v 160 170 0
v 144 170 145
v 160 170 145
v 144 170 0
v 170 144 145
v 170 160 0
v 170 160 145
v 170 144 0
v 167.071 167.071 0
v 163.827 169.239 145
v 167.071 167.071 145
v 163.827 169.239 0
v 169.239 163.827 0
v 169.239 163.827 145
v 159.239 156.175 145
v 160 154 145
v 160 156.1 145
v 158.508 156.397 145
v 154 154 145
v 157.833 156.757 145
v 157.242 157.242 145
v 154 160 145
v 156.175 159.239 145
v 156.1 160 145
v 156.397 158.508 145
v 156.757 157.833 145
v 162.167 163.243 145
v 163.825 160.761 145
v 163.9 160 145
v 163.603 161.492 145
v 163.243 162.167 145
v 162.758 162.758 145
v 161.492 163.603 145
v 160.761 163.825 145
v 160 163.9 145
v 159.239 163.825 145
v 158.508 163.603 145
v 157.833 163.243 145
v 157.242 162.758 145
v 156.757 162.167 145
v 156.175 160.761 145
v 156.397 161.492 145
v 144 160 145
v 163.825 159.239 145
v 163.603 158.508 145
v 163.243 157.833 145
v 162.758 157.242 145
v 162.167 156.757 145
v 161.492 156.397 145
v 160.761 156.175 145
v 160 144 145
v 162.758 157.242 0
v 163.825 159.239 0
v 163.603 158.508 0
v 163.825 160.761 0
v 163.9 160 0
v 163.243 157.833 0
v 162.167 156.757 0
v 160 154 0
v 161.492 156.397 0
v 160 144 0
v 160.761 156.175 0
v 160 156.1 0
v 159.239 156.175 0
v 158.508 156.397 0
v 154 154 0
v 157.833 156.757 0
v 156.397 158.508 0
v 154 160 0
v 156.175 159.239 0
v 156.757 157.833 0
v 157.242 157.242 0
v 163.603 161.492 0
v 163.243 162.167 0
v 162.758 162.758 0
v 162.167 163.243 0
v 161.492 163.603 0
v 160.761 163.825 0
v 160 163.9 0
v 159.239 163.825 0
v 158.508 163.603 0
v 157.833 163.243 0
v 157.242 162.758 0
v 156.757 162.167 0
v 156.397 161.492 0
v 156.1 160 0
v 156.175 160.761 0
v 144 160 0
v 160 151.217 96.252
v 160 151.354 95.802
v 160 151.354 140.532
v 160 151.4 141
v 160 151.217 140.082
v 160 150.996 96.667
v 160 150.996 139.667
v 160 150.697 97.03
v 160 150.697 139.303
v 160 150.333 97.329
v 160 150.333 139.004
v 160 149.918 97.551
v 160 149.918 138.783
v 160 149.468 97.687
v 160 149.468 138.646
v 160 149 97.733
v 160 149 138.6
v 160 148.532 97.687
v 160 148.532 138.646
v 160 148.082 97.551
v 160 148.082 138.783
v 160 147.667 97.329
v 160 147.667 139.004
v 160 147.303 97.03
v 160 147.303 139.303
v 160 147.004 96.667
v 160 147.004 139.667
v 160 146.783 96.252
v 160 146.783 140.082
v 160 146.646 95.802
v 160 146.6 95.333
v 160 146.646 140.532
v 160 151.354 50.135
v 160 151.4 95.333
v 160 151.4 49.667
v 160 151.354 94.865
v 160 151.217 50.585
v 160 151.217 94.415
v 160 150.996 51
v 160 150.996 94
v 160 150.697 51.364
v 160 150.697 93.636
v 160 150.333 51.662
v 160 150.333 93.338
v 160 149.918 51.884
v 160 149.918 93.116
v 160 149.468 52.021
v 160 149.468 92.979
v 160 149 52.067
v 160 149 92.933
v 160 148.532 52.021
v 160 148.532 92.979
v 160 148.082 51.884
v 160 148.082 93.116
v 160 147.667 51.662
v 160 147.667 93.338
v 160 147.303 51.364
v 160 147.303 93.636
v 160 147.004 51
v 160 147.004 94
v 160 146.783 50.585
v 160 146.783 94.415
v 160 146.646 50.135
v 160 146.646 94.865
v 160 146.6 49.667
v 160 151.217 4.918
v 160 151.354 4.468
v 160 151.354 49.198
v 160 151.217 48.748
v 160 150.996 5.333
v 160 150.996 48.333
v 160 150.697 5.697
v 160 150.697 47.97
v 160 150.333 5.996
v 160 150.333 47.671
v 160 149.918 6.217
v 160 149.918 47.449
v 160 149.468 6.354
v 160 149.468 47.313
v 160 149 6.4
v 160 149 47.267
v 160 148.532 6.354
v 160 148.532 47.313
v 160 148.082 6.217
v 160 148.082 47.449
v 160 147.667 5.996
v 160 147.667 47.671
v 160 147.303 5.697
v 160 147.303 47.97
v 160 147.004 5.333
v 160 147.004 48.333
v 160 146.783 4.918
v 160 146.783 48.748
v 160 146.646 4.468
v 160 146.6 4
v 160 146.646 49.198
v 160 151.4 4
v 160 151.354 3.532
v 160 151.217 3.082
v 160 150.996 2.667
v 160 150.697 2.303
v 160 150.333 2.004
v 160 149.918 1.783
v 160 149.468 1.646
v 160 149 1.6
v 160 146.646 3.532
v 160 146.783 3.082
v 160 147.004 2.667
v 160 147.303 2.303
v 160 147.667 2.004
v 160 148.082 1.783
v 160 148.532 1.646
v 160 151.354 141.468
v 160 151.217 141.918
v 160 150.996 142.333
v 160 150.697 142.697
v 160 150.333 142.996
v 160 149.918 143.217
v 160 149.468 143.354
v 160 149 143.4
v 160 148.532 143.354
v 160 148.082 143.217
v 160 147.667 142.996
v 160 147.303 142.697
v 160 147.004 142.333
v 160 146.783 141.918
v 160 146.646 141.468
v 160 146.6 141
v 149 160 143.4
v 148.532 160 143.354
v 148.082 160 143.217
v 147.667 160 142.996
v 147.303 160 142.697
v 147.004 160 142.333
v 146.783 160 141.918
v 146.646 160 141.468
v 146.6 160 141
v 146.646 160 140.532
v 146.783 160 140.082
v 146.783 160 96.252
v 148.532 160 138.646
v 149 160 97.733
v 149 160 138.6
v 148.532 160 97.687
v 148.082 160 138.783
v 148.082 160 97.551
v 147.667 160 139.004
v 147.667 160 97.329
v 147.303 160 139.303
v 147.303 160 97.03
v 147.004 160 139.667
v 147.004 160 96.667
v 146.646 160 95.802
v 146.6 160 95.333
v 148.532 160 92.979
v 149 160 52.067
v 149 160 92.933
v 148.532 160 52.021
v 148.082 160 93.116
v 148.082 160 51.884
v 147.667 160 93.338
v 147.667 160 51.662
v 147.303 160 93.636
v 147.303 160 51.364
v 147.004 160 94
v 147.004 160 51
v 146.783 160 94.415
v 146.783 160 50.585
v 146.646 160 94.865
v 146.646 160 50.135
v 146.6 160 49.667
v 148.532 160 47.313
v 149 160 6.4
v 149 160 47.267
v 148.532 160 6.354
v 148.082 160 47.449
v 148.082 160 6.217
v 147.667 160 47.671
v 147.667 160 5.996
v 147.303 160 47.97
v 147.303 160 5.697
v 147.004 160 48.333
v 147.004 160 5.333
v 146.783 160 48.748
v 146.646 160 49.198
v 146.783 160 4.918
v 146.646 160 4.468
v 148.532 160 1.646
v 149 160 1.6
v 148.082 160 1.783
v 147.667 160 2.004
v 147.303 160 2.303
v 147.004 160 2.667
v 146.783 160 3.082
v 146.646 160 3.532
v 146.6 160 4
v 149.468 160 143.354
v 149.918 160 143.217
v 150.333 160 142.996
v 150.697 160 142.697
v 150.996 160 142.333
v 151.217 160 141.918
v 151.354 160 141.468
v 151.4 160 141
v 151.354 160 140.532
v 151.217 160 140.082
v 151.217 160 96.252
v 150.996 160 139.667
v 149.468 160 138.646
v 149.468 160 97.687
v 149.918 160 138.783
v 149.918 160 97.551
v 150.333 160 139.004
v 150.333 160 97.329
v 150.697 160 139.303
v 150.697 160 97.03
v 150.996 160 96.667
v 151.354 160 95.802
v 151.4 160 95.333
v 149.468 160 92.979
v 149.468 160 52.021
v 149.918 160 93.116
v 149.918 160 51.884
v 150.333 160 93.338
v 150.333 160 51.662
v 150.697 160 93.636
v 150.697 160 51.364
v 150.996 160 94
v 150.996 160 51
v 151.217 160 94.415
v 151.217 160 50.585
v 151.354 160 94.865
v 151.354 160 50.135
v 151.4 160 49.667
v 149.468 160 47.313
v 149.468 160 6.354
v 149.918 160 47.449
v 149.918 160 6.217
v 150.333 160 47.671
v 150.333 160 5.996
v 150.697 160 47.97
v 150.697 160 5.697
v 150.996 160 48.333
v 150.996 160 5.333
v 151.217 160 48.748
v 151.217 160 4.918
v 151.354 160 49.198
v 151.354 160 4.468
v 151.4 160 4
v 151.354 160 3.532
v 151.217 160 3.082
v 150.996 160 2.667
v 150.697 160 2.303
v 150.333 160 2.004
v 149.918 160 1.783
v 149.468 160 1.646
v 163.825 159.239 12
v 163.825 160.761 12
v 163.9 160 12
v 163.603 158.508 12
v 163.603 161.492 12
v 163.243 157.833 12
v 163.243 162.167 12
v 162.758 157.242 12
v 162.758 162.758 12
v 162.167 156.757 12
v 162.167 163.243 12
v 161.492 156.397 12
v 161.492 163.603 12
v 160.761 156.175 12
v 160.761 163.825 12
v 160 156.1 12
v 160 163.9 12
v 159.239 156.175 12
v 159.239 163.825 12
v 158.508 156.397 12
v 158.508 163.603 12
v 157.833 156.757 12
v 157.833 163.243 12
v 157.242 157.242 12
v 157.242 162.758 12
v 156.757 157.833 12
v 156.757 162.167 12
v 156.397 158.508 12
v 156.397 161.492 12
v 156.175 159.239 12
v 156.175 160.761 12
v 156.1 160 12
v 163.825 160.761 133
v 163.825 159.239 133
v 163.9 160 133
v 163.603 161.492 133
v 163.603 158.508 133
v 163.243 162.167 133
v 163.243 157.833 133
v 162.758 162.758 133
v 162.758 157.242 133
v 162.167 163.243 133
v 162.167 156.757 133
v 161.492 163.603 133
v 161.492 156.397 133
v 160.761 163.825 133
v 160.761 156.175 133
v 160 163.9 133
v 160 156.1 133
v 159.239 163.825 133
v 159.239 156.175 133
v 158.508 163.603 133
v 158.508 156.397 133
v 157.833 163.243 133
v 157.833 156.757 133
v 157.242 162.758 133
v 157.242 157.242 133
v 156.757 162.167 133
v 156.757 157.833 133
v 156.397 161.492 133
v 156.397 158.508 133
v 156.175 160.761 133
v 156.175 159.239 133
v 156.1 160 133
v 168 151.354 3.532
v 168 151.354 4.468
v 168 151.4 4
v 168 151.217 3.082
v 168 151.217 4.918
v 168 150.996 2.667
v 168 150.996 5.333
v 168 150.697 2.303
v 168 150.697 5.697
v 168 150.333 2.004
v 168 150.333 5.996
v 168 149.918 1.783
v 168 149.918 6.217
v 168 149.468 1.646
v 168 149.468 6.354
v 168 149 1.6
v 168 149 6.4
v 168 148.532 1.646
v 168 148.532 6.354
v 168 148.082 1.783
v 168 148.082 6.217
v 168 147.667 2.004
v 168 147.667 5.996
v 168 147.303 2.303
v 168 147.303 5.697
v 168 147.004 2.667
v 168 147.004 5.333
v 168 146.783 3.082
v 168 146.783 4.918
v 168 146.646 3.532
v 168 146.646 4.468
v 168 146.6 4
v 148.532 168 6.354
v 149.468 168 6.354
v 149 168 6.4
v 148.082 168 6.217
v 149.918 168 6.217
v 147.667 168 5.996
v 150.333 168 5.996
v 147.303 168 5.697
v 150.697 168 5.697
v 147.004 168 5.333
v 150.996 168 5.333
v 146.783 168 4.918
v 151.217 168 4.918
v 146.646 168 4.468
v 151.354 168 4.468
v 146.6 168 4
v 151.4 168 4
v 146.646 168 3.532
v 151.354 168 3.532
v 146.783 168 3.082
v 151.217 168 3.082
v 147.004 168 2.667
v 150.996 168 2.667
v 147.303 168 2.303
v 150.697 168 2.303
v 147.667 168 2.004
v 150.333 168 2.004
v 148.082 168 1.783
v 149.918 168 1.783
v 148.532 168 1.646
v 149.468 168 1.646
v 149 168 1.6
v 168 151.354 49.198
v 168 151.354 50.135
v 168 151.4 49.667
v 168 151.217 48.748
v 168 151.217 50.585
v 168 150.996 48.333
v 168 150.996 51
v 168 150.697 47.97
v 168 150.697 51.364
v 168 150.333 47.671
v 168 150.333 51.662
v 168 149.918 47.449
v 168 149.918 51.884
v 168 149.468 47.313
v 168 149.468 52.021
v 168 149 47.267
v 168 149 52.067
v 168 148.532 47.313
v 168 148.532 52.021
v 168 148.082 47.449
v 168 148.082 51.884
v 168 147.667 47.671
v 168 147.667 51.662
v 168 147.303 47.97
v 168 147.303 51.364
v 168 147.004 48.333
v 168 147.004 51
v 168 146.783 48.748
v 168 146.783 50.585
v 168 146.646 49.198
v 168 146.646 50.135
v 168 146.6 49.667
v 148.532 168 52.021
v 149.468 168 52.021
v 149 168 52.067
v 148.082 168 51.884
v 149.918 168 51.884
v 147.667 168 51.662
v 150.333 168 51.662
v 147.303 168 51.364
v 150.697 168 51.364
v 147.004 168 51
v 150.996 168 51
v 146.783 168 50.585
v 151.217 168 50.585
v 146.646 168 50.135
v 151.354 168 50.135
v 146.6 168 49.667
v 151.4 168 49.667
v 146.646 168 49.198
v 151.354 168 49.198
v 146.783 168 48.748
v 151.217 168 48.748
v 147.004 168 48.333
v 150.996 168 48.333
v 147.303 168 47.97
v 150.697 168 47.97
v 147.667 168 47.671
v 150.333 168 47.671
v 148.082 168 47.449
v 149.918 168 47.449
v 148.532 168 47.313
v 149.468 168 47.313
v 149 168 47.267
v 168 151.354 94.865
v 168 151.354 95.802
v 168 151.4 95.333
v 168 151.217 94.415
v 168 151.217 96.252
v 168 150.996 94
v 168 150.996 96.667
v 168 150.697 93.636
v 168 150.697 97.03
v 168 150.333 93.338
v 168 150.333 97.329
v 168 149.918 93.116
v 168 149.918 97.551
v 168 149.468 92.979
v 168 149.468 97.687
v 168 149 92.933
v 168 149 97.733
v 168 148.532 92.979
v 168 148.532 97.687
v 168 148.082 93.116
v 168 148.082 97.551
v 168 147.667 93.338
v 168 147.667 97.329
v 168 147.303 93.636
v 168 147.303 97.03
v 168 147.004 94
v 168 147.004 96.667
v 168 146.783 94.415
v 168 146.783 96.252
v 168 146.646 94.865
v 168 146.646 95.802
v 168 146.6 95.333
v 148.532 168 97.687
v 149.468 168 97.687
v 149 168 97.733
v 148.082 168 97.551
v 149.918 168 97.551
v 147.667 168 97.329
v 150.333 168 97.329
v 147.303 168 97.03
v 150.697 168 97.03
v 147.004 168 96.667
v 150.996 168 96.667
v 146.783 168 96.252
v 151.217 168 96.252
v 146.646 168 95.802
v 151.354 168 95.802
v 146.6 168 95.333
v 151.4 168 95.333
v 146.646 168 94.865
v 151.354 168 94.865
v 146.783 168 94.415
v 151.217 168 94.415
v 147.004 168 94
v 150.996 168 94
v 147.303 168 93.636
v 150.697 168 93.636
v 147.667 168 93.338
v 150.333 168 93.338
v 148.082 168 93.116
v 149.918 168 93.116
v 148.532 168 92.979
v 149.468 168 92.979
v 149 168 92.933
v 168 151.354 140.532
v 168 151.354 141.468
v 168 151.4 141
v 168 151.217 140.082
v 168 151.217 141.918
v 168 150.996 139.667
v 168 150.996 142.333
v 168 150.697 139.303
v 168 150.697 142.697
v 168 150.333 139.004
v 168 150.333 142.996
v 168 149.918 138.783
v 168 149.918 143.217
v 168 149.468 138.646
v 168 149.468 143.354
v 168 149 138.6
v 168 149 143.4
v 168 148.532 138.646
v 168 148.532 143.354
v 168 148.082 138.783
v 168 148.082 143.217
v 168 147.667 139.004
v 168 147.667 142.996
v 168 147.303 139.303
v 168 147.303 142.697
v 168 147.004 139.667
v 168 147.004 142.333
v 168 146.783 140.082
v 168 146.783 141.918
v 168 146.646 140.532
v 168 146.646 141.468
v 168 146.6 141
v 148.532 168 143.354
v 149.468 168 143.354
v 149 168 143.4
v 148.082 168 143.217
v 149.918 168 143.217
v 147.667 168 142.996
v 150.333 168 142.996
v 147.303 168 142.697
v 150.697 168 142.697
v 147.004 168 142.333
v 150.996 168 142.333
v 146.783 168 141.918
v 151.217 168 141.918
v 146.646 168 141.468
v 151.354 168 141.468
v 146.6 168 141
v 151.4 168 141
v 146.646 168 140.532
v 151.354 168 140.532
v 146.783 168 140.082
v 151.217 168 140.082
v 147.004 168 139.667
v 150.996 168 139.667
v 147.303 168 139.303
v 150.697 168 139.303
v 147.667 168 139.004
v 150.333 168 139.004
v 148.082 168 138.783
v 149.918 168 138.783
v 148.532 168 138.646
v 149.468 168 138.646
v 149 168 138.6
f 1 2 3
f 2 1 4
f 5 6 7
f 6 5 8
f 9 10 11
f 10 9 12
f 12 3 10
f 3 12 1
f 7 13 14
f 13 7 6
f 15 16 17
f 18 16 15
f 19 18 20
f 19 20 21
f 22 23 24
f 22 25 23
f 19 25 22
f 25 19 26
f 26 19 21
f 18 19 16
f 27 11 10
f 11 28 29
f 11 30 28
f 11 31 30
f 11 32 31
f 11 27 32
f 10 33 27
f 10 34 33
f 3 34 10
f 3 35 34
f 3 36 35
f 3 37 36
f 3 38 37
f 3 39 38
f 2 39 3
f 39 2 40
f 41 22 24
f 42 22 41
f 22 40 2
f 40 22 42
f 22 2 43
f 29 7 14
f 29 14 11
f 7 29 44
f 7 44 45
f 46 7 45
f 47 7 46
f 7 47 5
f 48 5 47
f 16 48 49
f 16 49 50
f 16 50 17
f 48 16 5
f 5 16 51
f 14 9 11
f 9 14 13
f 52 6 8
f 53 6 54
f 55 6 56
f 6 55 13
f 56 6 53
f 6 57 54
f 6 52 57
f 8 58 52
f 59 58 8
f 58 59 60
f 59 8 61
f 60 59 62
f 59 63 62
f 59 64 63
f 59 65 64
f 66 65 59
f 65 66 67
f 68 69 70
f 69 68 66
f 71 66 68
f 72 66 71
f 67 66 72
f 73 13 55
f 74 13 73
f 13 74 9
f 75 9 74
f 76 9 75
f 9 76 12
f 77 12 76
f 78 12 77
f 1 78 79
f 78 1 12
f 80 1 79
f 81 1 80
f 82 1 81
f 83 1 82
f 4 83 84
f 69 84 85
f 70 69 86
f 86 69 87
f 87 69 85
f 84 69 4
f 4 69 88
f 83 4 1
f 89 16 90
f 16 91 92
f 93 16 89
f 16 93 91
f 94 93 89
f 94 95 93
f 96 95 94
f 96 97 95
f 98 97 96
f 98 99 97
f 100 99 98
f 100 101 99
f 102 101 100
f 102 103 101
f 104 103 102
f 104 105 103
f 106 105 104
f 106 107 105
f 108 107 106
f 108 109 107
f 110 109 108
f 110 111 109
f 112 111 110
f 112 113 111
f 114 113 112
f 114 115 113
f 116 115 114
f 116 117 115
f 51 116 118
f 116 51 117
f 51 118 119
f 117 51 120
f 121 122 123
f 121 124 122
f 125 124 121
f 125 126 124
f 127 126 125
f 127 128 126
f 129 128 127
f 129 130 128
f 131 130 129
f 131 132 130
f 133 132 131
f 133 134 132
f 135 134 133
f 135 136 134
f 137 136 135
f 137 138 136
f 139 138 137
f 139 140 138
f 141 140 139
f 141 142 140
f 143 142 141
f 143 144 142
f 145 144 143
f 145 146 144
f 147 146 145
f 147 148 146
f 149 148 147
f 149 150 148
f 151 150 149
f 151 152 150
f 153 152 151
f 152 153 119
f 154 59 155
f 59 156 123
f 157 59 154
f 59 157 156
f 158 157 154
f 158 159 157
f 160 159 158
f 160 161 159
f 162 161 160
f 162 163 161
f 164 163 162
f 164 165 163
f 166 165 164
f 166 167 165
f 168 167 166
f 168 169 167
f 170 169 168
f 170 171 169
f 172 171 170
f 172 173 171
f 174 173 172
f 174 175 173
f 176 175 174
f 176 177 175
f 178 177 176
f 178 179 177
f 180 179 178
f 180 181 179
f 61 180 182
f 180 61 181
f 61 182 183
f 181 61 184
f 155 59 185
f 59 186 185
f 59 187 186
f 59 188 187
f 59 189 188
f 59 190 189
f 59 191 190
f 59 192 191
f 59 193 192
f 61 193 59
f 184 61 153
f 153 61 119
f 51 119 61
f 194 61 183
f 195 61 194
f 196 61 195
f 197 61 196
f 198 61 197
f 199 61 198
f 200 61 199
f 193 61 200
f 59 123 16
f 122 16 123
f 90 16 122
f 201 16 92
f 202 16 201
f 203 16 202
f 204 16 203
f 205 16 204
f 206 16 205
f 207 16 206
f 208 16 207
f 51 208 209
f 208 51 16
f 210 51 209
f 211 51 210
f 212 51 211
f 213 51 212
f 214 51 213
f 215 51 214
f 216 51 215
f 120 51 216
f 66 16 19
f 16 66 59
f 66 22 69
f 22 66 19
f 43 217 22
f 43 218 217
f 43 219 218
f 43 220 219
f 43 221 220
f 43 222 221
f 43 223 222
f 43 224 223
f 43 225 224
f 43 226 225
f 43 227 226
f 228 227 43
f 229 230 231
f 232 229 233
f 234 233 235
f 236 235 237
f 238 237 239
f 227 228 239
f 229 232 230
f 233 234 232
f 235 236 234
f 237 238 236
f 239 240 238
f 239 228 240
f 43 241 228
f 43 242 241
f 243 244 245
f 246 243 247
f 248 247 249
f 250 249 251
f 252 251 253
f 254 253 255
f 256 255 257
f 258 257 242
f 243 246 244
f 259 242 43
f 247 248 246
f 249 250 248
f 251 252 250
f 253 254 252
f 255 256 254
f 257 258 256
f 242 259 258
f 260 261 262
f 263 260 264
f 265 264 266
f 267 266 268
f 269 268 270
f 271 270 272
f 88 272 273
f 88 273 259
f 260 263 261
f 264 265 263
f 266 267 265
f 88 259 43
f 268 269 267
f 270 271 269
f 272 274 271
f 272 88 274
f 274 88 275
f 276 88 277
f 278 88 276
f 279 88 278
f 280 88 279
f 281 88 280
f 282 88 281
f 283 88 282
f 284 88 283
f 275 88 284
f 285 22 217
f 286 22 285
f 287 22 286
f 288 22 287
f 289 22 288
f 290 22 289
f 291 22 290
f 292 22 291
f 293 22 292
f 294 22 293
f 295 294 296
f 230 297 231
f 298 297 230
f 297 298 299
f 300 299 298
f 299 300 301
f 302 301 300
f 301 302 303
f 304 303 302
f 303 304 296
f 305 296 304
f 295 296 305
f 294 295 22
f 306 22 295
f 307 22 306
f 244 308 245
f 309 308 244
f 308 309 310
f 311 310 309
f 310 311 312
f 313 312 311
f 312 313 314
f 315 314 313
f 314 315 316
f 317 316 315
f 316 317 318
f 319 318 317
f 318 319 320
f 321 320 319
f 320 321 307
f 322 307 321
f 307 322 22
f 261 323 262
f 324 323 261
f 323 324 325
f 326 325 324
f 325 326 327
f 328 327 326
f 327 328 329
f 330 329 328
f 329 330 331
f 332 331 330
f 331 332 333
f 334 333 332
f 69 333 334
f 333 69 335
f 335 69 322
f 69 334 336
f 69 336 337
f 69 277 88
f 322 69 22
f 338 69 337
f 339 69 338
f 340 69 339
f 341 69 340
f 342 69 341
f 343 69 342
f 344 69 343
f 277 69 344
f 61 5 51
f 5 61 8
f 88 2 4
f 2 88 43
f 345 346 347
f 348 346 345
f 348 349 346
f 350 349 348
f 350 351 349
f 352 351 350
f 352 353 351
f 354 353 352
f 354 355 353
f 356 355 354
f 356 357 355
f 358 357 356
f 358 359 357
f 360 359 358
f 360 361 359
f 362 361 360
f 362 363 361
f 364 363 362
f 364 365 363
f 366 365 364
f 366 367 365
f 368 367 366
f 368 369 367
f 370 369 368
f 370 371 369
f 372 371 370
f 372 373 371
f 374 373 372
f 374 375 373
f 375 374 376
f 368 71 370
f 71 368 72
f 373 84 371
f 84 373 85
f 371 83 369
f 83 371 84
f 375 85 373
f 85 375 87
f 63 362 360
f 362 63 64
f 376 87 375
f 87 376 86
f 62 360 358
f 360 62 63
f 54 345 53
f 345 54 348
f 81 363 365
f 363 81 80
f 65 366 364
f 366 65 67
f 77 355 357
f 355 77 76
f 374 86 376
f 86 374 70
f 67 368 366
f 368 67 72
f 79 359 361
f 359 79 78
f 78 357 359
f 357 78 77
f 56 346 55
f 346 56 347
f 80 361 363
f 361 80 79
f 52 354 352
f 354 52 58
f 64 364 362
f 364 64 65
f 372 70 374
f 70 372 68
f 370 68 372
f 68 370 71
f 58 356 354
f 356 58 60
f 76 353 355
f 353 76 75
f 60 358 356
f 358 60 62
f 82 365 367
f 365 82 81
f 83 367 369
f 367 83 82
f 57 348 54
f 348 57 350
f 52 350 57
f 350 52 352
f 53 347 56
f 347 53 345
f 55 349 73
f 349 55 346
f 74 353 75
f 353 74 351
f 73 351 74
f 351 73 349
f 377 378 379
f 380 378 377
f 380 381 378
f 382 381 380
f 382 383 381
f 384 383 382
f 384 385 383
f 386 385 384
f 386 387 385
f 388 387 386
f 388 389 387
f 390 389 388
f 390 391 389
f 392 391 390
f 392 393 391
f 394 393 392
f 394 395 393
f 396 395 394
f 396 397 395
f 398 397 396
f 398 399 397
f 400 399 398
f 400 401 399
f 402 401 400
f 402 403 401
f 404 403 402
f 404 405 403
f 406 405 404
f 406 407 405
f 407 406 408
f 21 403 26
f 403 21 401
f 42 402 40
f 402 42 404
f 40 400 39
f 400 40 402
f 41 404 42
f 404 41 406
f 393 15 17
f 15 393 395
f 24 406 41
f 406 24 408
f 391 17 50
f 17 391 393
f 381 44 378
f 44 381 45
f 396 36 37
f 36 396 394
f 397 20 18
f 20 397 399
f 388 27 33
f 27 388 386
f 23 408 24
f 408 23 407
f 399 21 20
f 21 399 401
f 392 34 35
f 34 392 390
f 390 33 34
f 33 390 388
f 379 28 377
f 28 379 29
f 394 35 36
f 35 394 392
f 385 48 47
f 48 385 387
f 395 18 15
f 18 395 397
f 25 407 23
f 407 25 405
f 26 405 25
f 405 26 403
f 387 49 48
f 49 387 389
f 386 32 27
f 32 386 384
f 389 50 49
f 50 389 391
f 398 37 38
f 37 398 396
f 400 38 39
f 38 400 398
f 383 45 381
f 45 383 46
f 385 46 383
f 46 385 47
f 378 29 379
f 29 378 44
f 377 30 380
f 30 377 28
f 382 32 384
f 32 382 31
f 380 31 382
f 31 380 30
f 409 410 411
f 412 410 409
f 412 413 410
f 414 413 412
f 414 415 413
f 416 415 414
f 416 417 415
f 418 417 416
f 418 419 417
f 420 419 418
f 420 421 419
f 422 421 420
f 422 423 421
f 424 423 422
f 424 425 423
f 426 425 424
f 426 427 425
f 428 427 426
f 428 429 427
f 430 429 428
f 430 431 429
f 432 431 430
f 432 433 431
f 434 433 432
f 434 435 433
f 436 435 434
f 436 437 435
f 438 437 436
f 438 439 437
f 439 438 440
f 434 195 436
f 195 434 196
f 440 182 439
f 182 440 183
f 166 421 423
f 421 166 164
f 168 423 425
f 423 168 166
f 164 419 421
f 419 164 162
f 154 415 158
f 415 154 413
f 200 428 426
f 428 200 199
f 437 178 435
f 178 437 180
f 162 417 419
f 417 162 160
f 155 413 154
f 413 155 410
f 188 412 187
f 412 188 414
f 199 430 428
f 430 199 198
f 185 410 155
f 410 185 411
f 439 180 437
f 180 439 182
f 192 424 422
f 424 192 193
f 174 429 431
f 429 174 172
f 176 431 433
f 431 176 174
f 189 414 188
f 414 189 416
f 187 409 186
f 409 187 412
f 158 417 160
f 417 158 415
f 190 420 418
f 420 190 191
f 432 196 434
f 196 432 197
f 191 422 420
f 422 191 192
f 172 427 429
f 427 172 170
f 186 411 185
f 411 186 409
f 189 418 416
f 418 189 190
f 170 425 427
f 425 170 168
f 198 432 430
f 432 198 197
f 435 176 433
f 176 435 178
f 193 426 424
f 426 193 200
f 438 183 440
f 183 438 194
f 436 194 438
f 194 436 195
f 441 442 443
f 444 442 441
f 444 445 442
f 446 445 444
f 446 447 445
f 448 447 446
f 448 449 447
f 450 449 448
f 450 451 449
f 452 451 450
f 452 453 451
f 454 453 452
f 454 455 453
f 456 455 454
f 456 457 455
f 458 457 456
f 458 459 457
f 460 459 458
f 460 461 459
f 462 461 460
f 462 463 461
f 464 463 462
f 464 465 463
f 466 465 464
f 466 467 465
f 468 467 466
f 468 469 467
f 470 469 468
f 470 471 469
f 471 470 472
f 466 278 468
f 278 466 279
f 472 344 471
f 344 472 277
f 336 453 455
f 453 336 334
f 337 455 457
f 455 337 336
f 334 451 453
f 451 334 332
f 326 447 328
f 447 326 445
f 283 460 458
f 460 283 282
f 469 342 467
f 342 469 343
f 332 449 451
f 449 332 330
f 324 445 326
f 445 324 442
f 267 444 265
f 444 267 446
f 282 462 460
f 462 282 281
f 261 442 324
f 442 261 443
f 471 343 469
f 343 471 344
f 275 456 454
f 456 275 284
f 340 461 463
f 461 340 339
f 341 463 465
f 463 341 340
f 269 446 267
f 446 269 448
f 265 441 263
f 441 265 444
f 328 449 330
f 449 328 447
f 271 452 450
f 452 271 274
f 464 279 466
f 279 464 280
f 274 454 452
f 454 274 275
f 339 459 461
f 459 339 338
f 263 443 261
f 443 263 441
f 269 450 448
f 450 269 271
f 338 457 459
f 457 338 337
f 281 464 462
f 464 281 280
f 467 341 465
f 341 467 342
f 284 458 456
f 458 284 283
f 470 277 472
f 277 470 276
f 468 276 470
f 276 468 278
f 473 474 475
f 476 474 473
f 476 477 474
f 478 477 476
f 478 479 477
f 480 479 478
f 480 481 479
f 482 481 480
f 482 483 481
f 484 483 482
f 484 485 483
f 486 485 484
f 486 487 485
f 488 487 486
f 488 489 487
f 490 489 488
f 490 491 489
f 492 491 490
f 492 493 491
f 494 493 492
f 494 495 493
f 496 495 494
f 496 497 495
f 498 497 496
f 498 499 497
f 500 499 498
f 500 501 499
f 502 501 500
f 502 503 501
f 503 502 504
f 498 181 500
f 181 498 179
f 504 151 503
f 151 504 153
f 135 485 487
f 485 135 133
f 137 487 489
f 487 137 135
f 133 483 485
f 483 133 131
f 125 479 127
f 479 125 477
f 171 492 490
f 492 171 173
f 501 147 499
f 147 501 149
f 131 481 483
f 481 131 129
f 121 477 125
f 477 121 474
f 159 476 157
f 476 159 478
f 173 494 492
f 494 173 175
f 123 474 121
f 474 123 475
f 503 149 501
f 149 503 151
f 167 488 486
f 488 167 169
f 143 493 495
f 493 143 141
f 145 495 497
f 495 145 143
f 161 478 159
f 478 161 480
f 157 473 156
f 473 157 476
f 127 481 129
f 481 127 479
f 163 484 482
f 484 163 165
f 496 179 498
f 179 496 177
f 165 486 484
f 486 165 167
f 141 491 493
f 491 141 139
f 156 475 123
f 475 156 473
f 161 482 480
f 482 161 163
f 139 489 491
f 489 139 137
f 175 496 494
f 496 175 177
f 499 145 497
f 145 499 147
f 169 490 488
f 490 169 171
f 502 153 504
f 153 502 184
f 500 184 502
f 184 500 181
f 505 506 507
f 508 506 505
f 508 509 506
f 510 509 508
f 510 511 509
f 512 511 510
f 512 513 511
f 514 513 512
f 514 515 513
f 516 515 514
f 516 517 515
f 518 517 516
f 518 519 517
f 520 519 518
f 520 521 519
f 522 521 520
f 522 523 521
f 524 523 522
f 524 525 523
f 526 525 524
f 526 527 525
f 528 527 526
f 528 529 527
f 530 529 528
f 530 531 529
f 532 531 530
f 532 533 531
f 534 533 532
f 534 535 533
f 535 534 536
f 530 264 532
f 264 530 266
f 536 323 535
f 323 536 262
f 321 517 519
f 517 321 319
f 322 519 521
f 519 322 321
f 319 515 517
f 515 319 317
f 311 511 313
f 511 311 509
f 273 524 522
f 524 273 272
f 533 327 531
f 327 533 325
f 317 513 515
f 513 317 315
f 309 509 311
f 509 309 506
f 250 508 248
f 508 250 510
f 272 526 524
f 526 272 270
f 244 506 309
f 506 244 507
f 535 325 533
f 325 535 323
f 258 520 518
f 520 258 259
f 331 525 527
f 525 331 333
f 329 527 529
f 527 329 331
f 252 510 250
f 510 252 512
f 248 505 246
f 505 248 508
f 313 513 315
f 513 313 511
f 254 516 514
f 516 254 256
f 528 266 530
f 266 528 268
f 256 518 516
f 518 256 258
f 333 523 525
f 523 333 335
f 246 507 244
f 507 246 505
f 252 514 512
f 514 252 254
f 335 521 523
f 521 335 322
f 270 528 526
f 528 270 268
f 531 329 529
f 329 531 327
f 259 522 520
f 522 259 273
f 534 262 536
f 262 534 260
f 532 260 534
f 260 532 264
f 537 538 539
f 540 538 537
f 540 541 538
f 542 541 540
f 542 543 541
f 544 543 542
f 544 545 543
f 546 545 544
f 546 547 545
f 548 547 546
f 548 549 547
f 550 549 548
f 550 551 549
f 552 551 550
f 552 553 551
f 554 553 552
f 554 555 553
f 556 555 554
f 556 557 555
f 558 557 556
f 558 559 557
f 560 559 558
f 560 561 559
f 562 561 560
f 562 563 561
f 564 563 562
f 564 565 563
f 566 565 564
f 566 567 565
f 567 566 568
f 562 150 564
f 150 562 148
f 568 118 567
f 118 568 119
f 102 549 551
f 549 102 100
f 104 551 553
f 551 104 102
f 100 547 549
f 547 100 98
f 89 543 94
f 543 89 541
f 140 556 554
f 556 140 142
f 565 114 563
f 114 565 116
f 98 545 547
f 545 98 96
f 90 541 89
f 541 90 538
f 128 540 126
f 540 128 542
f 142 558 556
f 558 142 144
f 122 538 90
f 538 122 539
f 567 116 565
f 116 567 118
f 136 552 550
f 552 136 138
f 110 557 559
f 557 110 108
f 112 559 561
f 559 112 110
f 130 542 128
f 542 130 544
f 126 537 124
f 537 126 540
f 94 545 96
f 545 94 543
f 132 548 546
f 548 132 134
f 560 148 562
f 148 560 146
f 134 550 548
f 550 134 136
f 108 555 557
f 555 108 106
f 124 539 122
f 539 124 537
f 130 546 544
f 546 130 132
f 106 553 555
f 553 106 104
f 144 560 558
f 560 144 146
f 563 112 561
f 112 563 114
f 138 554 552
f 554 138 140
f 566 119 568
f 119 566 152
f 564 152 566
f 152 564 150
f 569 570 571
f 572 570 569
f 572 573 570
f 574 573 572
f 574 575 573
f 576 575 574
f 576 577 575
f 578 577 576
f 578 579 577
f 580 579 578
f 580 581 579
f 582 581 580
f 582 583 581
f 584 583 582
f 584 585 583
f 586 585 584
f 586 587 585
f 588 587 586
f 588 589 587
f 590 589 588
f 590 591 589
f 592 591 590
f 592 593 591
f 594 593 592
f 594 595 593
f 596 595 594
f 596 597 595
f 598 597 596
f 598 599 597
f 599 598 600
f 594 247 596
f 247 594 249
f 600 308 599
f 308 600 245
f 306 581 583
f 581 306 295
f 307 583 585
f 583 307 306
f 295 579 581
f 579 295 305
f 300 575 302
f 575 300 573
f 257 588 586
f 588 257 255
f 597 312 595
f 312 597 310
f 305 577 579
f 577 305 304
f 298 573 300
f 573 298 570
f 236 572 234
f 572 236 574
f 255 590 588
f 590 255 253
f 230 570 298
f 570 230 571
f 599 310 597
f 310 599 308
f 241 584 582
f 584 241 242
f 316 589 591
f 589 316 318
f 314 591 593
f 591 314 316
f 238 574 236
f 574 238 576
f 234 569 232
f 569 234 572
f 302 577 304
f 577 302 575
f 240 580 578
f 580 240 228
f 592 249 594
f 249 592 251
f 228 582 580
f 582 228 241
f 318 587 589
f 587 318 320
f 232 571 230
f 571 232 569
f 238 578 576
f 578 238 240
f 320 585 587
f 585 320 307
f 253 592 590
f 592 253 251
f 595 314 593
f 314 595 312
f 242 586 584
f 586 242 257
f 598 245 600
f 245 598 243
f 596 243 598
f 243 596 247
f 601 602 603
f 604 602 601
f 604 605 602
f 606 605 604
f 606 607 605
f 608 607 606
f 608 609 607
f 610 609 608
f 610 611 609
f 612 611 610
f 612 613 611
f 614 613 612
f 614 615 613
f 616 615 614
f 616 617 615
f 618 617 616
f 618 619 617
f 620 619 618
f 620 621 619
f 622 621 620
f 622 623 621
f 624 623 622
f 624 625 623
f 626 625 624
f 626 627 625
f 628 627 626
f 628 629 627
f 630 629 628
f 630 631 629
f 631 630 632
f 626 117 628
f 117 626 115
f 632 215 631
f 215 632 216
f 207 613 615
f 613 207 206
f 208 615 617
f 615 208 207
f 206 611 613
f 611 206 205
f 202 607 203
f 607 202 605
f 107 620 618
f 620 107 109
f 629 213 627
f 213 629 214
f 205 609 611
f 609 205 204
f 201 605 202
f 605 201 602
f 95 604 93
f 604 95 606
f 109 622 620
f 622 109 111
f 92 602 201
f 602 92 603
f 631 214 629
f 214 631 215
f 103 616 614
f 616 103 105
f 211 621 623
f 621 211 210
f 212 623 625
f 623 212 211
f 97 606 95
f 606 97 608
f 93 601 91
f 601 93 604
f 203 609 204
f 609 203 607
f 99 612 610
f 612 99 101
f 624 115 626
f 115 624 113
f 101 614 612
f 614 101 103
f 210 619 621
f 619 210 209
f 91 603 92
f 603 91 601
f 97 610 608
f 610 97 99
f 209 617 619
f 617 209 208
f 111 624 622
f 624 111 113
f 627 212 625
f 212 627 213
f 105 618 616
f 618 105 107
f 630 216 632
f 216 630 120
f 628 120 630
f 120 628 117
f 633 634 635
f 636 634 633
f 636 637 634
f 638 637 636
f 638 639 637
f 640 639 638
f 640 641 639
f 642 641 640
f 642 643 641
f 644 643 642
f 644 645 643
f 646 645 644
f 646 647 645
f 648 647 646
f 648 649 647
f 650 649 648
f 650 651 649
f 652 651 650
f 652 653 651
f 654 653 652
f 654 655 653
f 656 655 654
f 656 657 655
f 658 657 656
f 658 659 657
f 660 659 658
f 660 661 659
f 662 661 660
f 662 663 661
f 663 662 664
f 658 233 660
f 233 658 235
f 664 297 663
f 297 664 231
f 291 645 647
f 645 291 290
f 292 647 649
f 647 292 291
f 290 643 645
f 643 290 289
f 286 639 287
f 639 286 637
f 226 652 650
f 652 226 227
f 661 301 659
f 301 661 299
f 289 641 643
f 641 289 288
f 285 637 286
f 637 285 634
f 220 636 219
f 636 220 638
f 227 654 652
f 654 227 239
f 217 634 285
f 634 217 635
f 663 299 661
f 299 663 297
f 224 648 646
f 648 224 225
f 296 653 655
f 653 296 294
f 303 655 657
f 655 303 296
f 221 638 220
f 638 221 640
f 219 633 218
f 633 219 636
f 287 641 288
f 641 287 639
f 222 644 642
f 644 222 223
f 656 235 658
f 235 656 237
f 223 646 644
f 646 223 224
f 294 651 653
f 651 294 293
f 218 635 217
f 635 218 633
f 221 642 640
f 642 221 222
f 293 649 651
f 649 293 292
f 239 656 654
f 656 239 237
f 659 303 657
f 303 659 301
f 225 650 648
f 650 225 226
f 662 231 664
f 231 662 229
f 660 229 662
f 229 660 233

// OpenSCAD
// file: fan.scad
use <bolts.scad>;
use <zcube.scad>;

module fan(diameter = 140, thickness = 25) {
	translate([-diameter/2, -diameter/2, -thickness]) color("blue") cube([diameter, diameter, thickness]);
}

module fan_holes(diameter = 140, spacing = 124.5, z = 10) {
	outset = spacing / 2;
	
	translate([outset, outset, z]) children();
	translate([-outset, outset, z]) children();
	translate([-outset, -outset, z]) children();
	translate([outset, -outset, z]) children();
}

module fan_cutout(diameter = 140, thickness = 6, wall = 3, spacing = 124.5) {
	render() {
		translate([0, 0, -0.1]) cylinder_outer(thickness+0.2, diameter/2);
		
		translate([0, 0, wall]) zcorners() hull() {
			translate([-spacing/2, -spacing/2, 0]) cylinder_outer(thickness-wall+0.1, (diameter-spacing)/2);
			cylinder_outer(thickness-wall+0.1, diameter/5);
		}
		
		fan_holes() translate([0, 0, -35]) hole(3, 35);
	}
}

color("brown") fan();
#fan_holes() translate([0, 0, -35]) hole(3, 35);
fan_cutout();
// file: sx500g.scad
use <bolts.scad>;
use <zcube.scad>;

module sx500g() {
	difference() {
		// http://silverstonetek.com/goods_cable_define/sx500-g-cable-define.pdf
		color("grey") translate([-125/2, 0, -63]) cube([125, 100, 63]);
		sx500g_holes() rotate(90, [1, 0, 0]) hole(3, 10);
	}
}

module sx500g_holes(inset = 6, width = 125, height = 63) {
	translate([-width/2+inset, 0, -inset]) children();
	translate([width/2-inset, 0, -inset]) children();
	
	// TODO I don't know if this is correct.. 
	translate([-width/2+inset, 0, -height/2]) children();
	translate([width/2-inset, 0, -height/2]) children();
	
	translate([-width/2+inset, 0, inset-height]) children();
	translate([width/2-inset, 0, inset-height]) children();
}

module sx500g_cutout(thickness = 10, inset = 10) {
	render() difference() {
		color("grey") translate([0, 0.1, -63/2]) rotate([90, 0, 0]) zcube([125-inset, 63-inset, thickness+0.2]);

		sx500g_holes() rotate([90, 0, 0]) cylinder(d=10, h=thickness+0.1);
	}
	
	sx500g_holes() translate([0, 30-thickness, 0]) rotate([90, 0, 0]) hole(3, 30);
}

sx500g();
color("red") sx500g_cutout();
// file: h115i.scad
use <bolts.scad>;

use <fan.scad>;

module h115i(diameter = 140, spacing = 124.5, offset = 20) {
	outset = (diameter - spacing) / 2;
	dy = (offset / 2) - outset;
	
	// Corsair H115i
	// Radiator dimensions: 140mm x 312mm x 26mm
	// Fan dimensions: 140mm x 25mm
	render() difference() {
		union() {
			color([0.1, 0.1, 0.1]) translate([-(26+25), -312/2, -140/2]) cube([26, 312, 140]);
			
			color("blue") {
				translate([0, -70-dy, 0]) rotate([0, 90, 0]) fan();
				translate([0, 70+dy, 0]) rotate([0, 90, 0]) fan();
			}
		}
		
		h115i_cutout();
	}
}

module h115i_cutout(diameter = 140, spacing = 124.5, offset = 20) {
	outset = (diameter - spacing) / 2;
	dy = (offset / 2) - outset;
	
	translate([0, -70-dy, 0]) rotate([0, 90, 0]) fan_cutout();
	translate([0, 70+dy, 0]) rotate([0, 90, 0]) fan_cutout();
}

h115i();
color("red") h115i_cutout();
// file: zcube.scad
// This function creates a cube with a given x/y either above (f=1) or below (f=-1) the z axis.
module zcube(dimensions, z=0, f=1) {
	translate([0, 0, dimensions[2]/2 * f + z]) cube(dimensions, true);
}

module rcube(dimensions, d, z=0, f=1) {
	dx = dimensions[0]/2 - d/2;
	dy = dimensions[1]/2 - d/2;
	dz = dimensions[2]/2 * (f-1) + z;
	
	hull() {
		translate([-dx, -dy, dz]) cylinder(h=dimensions[2], d=d);
		translate([-dx, dy, dz]) cylinder(h=dimensions[2], d=d);
		translate([dx, -dy, dz]) cylinder(h=dimensions[2], d=d);
		translate([dx, dy, dz]) cylinder(h=dimensions[2], d=d);
	}
}

module zcorners() {
	children();
	mirror([1, 0, 0]) children();
	mirror([0, 1, 0]) children();
	mirror([1, 1, 0]) children();
}
// file: bolts.scad
$radial_error = 0.1;
$fn = 32;

module cylinder_outer(height, radius, fn=$fn, radial_error=$radial_error) {
	fudge = 1/cos(180/fn);
	cylinder(h=height,r=radius*fudge+$radial_error, $fn=fn);
}

module cylinder_inner(height, radius, fn=$fn) {
	cylinder(h=height,r=radius-$radial_error,$fn=fn);
}

// Make a hole. The diameter is the size of the screw (e.g. 3 for M3). Depth is how far the hole should go for the thread, and inset is how far out there should be a hole for the head to go.
module hole(diameter=3, depth=6, inset=10) {
	cylinder_outer(depth, diameter/2);
	translate([0, 0, depth]) cylinder_outer(inset, diameter, 32);
}

module countersunk_hole(diameter=3, depth=6, inset=10) {
	hole(diameter, depth, inset);
	translate([0, 0, depth-diameter/2]) cylinder(r1=diameter/2+$radial_error, r2=diameter+$radial_error, h=diameter/2);
}

module threaded_countersunk_hole(diameter=3, depth=6, inset=10) {
	hole(diameter*0.9, depth, inset);
	translate([0, 0, depth-diameter/2]) cylinder(r1=diameter/2+$radial_error, r2=diameter+$radial_error, h=diameter/2);
}

module knurled_insert(diameter = 3, depth = 6, thickness = 1) {
	cylinder_inner(depth, diameter/2 + thickness);
}

module knurled_hole(diameter = 3, depth = 6, inset = 10, insert = 4, thickness = 1) {
	hole(diameter, depth, inset);
	
	knurled_insert(diameter, insert, thickness);
}

module countersunk_knurled_hole(diameter = 3, depth = 6, inset = 10, insert = 4, thickness = 1) {
	countersunk_hole(diameter, depth, inset);
	
	knurled_insert(diameter, insert, thickness);
}

// Make a hole for a bolt/screw combination.
module bolted_hole(diameter=3, depth=8, nut_offset=2, shaft_length=10, inset=10) {
	hole(diameter, depth, inset);
	hull() {
		shaft_width = diameter;
		translate([0, 0, nut_offset]) rotate(360/12, [0, 0, 1]) cylinder_outer(diameter, shaft_width, 6);
		translate([0, shaft_length, nut_offset]) rotate(360/12, [0, 0, 1]) cylinder_outer(diameter, shaft_width, 6);
	}
}

module countersunk_bolted_hole(diameter=3, depth=8, nut_offset=2, shaft_length=10, inset=10) {
	countersunk_hole(diameter, depth, inset);
	hull() {
		shaft_width = diameter;
		translate([0, 0, nut_offset]) rotate(360/12, [0, 0, 1]) cylinder_outer(diameter, shaft_width, 6);
		translate([0, shaft_length, nut_offset]) rotate(360/12, [0, 0, 1]) cylinder_outer(diameter, shaft_width, 6);
	}
}

module mounting_hole(diameter=3, depth=6, inset=10, outset=3) {
	difference() {
		cylinder_outer(depth, diameter/2+outset);
		hole(diameter=diameter, depth=depth, inset=inset);
	}
}

render() rotate(90, [1, 0, 0]) difference() {
	cube([40, 10, 10]);
	translate([5, 5, 0]) bolted_hole(diameter=3, depth=8);
	translate([15, 5, 0]) bolted_hole(diameter=4, depth=8);
	translate([25, 5, 0]) countersunk_hole(diameter=4, depth=8);
	translate([35, 5, 0]) knurled_hole();
}
// file: matx.scad
$tolerance = 0.1;
$fn = 4*4;

use <bolts.scad>;
use <zcube.scad>;

use <h115i.scad>;
use <sx500g.scad>;

use <fan.scad>;

function inch(x) = x * 25.4;

internal_size = [308, 308, 140+5];

module pci_card() {
	translate([1.6/2, 19.8, 7.6+4]) rotate(-90, [0, 0, 1]) rotate(90, [1, 0, 0]) color("brown") import("gtx.stl", convexity=4);
}

module standoffs() {
	// DATUM B as per the microATX specification is the origin.
	children();
	translate([inch(1.8), 0, 0]) children();
	translate([inch(8), inch(-0.9), 0]) children();
	
	translate([0, inch(-6.1), 0]) {
		translate([inch(-0.8), 0, 0]) children();
		children();
		translate([inch(1.8), 0, 0]) children();
		translate([inch(8), 0, 0]) children();
	}
	
	translate([0, inch(-8.95), 0]) {
		translate([inch(1.8), 0, 0]) children();
		translate([inch(8), 0, 0]) children();
	}
}

module pci_connectors(inset = inch(-0.6), factor = 0.5, count = 4) {
	// This is the position of pin 0 is given when factor is 0, otherwise when factor = 0.5 it's the midpoints.
	translate([inch(-1.2), inset, 0]) {
		for (x = [0:1:count-1])
			translate([inch(0.8*(x+factor)), 0, 0]) children();
	}
}

module motherboard(thickness=1.6) {
	difference() {
		color("green") translate([inch(-1.35), inch(0.4-9.6), 0]) cube([inch(9.6), inch(9.6), thickness]);
		standoffs() color("white") cylinder(d=4, h=10, $fn=12);
	}
	
	//translate([6.64, -46.94, 0]) pci_card();
	translate([47.28, -46.94, 0]) pci_card();
	
	// A very rough approximation of where the CPU is likely to be.
	translate([inch(5), inch(-4.5), thickness]) color("silver") zcube([inch(3), inch(2.5), inch(1.5)]);
	
	color("grey") {
		pci_connectors() translate([0, 0, thickness]) scale([1.0, -1.0, 1.0]) cube([inch(0.4), inch(5), inch(0.4)]);
	}
}

module rear_io_cutout() {
	translate([inch(2.096), inch(0.483)-$tolerance, inch(-0.088)]) cube([inch(6.25), 20, inch(1.75)]);
	translate([inch(2.096-0.1), inch(0.483+0.05)-$tolerance, inch(-0.088-0.1)]) cube([inch(6.25+0.2), 20, inch(1.75+0.2)]);
}

module rear_powersupply() {
	translate([inch(2.096+3), inch(0.483-2), inch(2)]) {
		power_supply();
	}
}

module rear_pci_cutout(width = 14) {
	pci_connectors(inch(0.483), 0.5) {
		translate([-width/2, 0-$tolerance, 0]) cube([width, 20, 100]);
		translate([-inch(0.3), 0-$tolerance, 108.8]) cube([inch(0.8)+$tolerance, 20, 1]);
		translate([-inch(0.3), 0-$tolerance, 108.8]) cube([inch(0.8)+$tolerance, 20, 50]);
		
		// TODO Just eyeballed this.
		translate([9.215, 4.95, 108.8-5]) hole(3, 5);
		
		// TODO Just eyeballed this.
		translate([2.7, 8.95, 107]) zcube([8, 4, 6]);
	}
}

module rear_pci_bracket(width = 14) {
	pci_connectors(inch(0.483), 0.5) {
		translate([inch(0.1), 6, 108.8-6]) rcube([inch(0.9), 10, 6], 6);
	}
}

module walls(dimensions, thickness = 6) {
	render() difference() {
		color([0.2, 0.2, 0.2, 0.7]) {
			difference() {
				zcube([dimensions[0]+thickness*2, dimensions[1]+thickness*2, dimensions[2]], d=20);
				zcube(dimensions);
			}
			
			bottom_tray(dimensions) {
				rear_pci_bracket();
			}
		}
		
		front_fan(dimensions) fan_cutout();
		top_radiator(dimensions) h115i_cutout();
		back_power_supply(dimensions) sx500g_cutout();
		
		bottom_tray(dimensions) {
			// You need a small amount of clearance around this (0.1in)
			rear_io_cutout();
			rear_pci_cutout();
		}
		
		zcorners() corner(dimensions);
		zcorners() corner_cutout(dimensions);
	}
}

module front_fan(dimensions) {
	translate([-70-2.25, -dimensions[1]/2, dimensions[2]/2]) rotate([90, 0, 0]) children();
}

module top_radiator(dimensions) {
	translate([dimensions[0]/2, 0, dimensions[2]/2]) children();
}

module back_power_supply(dimensions) {
	translate([10, dimensions[1]/2, dimensions[2]-4]) rotate([0, 0, 180]) children();
}

module bottom_tray(dimensions, offset = 18) {
	translate([inch(-4.8)+8, dimensions[1]/2-inch(0.483), offset]) children();
}

module base(dimensions) {
	render() difference() {
		cylinder(d=150, h=4);
		cylinder(d=100, h=4);
	}
	
	bottom_tray(dimensions, 0) {
		render() difference() {
			standoffs() color("yellow") cylinder(d=6, h=12, $fn=12);
			standoffs() color("yellow") translate([0, 0, 12-6]) hole(3, 6);
		}
	}
}

module case(dimensions = internal_size, board_offset = 18) {
	bottom_tray(dimensions, board_offset) {
		motherboard();
	}

	top_radiator(dimensions) h115i();
	//back_power_supply(dimensions) sx500g();
	//front_fan(dimensions) fan();

	color("white") walls(dimensions);
	color("red") base(dimensions);
	
	render() difference() {
		zcorners() render() corner();
		zcorners() render() corner_cutout();
	}
}

module corner_mask(dimensions, outset = 10, thickness = 6) {
	translate([dimensions[0]/2, dimensions[1]/2, 0]) {
		translate([-outset+thickness, -outset+thickness, 0]) cube([outset, outset, dimensions[2]]);

		translate([thickness/2, -outset, 0]) cube([thickness/2, outset, dimensions[2]]);
		translate([-outset, thickness/2, 0]) cube([outset, thickness/2, dimensions[2]]);
	}
}

module join_edge(length, width = 1, height = 10, count = 11, zig = 0.2) {
	step = (length / (count+0.5)) / 4;
	offset = step * zig;
	
	for (i = [0:1:count]) {
		translate([0, i*step*4, 0]) linear_extrude(height=height) polygon([
			[-width, 0],
			[-width, step+offset],
			[width, step-offset],
			[width, step*3+offset],
			[-width, step*3-offset],
			[-width, step*4],
		]);
	}
}

module join_mask(dimensions, thickness = 6, width = 1) {
	translate([0, 0, thickness]) {
		rotate([90, 0, 0]) join_edge(dimensions[2]-thickness*2, height=dimensions[1]/2+thickness+$tolerance, width=width);
		
		translate([-width, 0, 0]) rotate([0, 0, 180]) cube([dimensions[0]/2-width, dimensions[1]/2+thickness, dimensions[2]-thickness*2]);
	}
}

module corner(dimensions = internal_size, thickness = 6, offset = 10, inset = 10) {
	sx = dimensions[0]+(thickness*2+offset*2);
	sy = dimensions[1]+(thickness*2+offset*2);
	
	render() difference() {
		intersection() {
			rcube([sx, sy, dimensions[2]], d=offset*2);
			cube([sx/2, sy/2, dimensions[2]]);
		}
		
		zcube([dimensions[0]+thickness*2, dimensions[1], dimensions[2]]);
		zcube([dimensions[0], dimensions[1]+thickness*2, dimensions[2]]);
		
		zcube([sx, dimensions[1]-inset*2, dimensions[2]]);
		zcube([dimensions[0]-inset*2, sy, dimensions[2]]);
	}
}

module corner_cutout(dimensions = internal_size, thickness = 6, offset = 10, inset = 10, panel_thickness = 6, panel_bolt_insert = 12) {
	translate([dimensions[0]/2, dimensions[1]/2, 0]) {
		// Requires knurled insert M6x12x8
		translate([thickness, thickness, panel_bolt_insert]) mirror([0, 0, 1]) rotate([0, 0, 45+90]) knurled_hole(6, panel_bolt_insert+panel_thickness, insert=panel_bolt_insert);
		translate([thickness, thickness, dimensions[2]-panel_bolt_insert]) rotate([0, 0, 45+90]) knurled_hole(6, panel_bolt_insert+panel_thickness, insert=panel_bolt_insert);
		
		bolt_length = thickness+offset-2;
		
		bolt_size = 3;
		vertical_inset = bolt_size + 1;
		vertical_offset = (dimensions[2]-vertical_inset*2) / 3;
		
		for (dz = [vertical_inset:vertical_offset:dimensions[2]]) {
			// Requires knurled insert M3x8x5mm, flat M3x14mm scews.
			#translate([bolt_length, -offset/2, dz]) rotate([0, -90, 0]) countersunk_knurled_hole(bolt_size, bolt_length, insert=offset-2);
			#translate([-offset/2, bolt_length, dz]) rotate([90, 0, 0]) countersunk_knurled_hole(bolt_size, bolt_length, insert=offset-2);
		}
	}
}

module panels(dimensions, thickness = 6, offset = 10) {
	sx = dimensions[0]+(thickness*2+offset*2);
	sy = dimensions[1]+(thickness*2+offset*2);
	
	render() difference() {
		// bottom and top of case
		//translate([0, 0, -thickness]) rcube([sx, sy, thickness], d=offset*2);
		translate([0, 0, dimensions[2]]) rcube([sx, sy, thickness], d=offset*2);
		
		corner_cutout(dimensions);
	}
}

case();
// main file
use <matx.scad>;

render() difference() {
	corner();
	corner_cutout();
}
